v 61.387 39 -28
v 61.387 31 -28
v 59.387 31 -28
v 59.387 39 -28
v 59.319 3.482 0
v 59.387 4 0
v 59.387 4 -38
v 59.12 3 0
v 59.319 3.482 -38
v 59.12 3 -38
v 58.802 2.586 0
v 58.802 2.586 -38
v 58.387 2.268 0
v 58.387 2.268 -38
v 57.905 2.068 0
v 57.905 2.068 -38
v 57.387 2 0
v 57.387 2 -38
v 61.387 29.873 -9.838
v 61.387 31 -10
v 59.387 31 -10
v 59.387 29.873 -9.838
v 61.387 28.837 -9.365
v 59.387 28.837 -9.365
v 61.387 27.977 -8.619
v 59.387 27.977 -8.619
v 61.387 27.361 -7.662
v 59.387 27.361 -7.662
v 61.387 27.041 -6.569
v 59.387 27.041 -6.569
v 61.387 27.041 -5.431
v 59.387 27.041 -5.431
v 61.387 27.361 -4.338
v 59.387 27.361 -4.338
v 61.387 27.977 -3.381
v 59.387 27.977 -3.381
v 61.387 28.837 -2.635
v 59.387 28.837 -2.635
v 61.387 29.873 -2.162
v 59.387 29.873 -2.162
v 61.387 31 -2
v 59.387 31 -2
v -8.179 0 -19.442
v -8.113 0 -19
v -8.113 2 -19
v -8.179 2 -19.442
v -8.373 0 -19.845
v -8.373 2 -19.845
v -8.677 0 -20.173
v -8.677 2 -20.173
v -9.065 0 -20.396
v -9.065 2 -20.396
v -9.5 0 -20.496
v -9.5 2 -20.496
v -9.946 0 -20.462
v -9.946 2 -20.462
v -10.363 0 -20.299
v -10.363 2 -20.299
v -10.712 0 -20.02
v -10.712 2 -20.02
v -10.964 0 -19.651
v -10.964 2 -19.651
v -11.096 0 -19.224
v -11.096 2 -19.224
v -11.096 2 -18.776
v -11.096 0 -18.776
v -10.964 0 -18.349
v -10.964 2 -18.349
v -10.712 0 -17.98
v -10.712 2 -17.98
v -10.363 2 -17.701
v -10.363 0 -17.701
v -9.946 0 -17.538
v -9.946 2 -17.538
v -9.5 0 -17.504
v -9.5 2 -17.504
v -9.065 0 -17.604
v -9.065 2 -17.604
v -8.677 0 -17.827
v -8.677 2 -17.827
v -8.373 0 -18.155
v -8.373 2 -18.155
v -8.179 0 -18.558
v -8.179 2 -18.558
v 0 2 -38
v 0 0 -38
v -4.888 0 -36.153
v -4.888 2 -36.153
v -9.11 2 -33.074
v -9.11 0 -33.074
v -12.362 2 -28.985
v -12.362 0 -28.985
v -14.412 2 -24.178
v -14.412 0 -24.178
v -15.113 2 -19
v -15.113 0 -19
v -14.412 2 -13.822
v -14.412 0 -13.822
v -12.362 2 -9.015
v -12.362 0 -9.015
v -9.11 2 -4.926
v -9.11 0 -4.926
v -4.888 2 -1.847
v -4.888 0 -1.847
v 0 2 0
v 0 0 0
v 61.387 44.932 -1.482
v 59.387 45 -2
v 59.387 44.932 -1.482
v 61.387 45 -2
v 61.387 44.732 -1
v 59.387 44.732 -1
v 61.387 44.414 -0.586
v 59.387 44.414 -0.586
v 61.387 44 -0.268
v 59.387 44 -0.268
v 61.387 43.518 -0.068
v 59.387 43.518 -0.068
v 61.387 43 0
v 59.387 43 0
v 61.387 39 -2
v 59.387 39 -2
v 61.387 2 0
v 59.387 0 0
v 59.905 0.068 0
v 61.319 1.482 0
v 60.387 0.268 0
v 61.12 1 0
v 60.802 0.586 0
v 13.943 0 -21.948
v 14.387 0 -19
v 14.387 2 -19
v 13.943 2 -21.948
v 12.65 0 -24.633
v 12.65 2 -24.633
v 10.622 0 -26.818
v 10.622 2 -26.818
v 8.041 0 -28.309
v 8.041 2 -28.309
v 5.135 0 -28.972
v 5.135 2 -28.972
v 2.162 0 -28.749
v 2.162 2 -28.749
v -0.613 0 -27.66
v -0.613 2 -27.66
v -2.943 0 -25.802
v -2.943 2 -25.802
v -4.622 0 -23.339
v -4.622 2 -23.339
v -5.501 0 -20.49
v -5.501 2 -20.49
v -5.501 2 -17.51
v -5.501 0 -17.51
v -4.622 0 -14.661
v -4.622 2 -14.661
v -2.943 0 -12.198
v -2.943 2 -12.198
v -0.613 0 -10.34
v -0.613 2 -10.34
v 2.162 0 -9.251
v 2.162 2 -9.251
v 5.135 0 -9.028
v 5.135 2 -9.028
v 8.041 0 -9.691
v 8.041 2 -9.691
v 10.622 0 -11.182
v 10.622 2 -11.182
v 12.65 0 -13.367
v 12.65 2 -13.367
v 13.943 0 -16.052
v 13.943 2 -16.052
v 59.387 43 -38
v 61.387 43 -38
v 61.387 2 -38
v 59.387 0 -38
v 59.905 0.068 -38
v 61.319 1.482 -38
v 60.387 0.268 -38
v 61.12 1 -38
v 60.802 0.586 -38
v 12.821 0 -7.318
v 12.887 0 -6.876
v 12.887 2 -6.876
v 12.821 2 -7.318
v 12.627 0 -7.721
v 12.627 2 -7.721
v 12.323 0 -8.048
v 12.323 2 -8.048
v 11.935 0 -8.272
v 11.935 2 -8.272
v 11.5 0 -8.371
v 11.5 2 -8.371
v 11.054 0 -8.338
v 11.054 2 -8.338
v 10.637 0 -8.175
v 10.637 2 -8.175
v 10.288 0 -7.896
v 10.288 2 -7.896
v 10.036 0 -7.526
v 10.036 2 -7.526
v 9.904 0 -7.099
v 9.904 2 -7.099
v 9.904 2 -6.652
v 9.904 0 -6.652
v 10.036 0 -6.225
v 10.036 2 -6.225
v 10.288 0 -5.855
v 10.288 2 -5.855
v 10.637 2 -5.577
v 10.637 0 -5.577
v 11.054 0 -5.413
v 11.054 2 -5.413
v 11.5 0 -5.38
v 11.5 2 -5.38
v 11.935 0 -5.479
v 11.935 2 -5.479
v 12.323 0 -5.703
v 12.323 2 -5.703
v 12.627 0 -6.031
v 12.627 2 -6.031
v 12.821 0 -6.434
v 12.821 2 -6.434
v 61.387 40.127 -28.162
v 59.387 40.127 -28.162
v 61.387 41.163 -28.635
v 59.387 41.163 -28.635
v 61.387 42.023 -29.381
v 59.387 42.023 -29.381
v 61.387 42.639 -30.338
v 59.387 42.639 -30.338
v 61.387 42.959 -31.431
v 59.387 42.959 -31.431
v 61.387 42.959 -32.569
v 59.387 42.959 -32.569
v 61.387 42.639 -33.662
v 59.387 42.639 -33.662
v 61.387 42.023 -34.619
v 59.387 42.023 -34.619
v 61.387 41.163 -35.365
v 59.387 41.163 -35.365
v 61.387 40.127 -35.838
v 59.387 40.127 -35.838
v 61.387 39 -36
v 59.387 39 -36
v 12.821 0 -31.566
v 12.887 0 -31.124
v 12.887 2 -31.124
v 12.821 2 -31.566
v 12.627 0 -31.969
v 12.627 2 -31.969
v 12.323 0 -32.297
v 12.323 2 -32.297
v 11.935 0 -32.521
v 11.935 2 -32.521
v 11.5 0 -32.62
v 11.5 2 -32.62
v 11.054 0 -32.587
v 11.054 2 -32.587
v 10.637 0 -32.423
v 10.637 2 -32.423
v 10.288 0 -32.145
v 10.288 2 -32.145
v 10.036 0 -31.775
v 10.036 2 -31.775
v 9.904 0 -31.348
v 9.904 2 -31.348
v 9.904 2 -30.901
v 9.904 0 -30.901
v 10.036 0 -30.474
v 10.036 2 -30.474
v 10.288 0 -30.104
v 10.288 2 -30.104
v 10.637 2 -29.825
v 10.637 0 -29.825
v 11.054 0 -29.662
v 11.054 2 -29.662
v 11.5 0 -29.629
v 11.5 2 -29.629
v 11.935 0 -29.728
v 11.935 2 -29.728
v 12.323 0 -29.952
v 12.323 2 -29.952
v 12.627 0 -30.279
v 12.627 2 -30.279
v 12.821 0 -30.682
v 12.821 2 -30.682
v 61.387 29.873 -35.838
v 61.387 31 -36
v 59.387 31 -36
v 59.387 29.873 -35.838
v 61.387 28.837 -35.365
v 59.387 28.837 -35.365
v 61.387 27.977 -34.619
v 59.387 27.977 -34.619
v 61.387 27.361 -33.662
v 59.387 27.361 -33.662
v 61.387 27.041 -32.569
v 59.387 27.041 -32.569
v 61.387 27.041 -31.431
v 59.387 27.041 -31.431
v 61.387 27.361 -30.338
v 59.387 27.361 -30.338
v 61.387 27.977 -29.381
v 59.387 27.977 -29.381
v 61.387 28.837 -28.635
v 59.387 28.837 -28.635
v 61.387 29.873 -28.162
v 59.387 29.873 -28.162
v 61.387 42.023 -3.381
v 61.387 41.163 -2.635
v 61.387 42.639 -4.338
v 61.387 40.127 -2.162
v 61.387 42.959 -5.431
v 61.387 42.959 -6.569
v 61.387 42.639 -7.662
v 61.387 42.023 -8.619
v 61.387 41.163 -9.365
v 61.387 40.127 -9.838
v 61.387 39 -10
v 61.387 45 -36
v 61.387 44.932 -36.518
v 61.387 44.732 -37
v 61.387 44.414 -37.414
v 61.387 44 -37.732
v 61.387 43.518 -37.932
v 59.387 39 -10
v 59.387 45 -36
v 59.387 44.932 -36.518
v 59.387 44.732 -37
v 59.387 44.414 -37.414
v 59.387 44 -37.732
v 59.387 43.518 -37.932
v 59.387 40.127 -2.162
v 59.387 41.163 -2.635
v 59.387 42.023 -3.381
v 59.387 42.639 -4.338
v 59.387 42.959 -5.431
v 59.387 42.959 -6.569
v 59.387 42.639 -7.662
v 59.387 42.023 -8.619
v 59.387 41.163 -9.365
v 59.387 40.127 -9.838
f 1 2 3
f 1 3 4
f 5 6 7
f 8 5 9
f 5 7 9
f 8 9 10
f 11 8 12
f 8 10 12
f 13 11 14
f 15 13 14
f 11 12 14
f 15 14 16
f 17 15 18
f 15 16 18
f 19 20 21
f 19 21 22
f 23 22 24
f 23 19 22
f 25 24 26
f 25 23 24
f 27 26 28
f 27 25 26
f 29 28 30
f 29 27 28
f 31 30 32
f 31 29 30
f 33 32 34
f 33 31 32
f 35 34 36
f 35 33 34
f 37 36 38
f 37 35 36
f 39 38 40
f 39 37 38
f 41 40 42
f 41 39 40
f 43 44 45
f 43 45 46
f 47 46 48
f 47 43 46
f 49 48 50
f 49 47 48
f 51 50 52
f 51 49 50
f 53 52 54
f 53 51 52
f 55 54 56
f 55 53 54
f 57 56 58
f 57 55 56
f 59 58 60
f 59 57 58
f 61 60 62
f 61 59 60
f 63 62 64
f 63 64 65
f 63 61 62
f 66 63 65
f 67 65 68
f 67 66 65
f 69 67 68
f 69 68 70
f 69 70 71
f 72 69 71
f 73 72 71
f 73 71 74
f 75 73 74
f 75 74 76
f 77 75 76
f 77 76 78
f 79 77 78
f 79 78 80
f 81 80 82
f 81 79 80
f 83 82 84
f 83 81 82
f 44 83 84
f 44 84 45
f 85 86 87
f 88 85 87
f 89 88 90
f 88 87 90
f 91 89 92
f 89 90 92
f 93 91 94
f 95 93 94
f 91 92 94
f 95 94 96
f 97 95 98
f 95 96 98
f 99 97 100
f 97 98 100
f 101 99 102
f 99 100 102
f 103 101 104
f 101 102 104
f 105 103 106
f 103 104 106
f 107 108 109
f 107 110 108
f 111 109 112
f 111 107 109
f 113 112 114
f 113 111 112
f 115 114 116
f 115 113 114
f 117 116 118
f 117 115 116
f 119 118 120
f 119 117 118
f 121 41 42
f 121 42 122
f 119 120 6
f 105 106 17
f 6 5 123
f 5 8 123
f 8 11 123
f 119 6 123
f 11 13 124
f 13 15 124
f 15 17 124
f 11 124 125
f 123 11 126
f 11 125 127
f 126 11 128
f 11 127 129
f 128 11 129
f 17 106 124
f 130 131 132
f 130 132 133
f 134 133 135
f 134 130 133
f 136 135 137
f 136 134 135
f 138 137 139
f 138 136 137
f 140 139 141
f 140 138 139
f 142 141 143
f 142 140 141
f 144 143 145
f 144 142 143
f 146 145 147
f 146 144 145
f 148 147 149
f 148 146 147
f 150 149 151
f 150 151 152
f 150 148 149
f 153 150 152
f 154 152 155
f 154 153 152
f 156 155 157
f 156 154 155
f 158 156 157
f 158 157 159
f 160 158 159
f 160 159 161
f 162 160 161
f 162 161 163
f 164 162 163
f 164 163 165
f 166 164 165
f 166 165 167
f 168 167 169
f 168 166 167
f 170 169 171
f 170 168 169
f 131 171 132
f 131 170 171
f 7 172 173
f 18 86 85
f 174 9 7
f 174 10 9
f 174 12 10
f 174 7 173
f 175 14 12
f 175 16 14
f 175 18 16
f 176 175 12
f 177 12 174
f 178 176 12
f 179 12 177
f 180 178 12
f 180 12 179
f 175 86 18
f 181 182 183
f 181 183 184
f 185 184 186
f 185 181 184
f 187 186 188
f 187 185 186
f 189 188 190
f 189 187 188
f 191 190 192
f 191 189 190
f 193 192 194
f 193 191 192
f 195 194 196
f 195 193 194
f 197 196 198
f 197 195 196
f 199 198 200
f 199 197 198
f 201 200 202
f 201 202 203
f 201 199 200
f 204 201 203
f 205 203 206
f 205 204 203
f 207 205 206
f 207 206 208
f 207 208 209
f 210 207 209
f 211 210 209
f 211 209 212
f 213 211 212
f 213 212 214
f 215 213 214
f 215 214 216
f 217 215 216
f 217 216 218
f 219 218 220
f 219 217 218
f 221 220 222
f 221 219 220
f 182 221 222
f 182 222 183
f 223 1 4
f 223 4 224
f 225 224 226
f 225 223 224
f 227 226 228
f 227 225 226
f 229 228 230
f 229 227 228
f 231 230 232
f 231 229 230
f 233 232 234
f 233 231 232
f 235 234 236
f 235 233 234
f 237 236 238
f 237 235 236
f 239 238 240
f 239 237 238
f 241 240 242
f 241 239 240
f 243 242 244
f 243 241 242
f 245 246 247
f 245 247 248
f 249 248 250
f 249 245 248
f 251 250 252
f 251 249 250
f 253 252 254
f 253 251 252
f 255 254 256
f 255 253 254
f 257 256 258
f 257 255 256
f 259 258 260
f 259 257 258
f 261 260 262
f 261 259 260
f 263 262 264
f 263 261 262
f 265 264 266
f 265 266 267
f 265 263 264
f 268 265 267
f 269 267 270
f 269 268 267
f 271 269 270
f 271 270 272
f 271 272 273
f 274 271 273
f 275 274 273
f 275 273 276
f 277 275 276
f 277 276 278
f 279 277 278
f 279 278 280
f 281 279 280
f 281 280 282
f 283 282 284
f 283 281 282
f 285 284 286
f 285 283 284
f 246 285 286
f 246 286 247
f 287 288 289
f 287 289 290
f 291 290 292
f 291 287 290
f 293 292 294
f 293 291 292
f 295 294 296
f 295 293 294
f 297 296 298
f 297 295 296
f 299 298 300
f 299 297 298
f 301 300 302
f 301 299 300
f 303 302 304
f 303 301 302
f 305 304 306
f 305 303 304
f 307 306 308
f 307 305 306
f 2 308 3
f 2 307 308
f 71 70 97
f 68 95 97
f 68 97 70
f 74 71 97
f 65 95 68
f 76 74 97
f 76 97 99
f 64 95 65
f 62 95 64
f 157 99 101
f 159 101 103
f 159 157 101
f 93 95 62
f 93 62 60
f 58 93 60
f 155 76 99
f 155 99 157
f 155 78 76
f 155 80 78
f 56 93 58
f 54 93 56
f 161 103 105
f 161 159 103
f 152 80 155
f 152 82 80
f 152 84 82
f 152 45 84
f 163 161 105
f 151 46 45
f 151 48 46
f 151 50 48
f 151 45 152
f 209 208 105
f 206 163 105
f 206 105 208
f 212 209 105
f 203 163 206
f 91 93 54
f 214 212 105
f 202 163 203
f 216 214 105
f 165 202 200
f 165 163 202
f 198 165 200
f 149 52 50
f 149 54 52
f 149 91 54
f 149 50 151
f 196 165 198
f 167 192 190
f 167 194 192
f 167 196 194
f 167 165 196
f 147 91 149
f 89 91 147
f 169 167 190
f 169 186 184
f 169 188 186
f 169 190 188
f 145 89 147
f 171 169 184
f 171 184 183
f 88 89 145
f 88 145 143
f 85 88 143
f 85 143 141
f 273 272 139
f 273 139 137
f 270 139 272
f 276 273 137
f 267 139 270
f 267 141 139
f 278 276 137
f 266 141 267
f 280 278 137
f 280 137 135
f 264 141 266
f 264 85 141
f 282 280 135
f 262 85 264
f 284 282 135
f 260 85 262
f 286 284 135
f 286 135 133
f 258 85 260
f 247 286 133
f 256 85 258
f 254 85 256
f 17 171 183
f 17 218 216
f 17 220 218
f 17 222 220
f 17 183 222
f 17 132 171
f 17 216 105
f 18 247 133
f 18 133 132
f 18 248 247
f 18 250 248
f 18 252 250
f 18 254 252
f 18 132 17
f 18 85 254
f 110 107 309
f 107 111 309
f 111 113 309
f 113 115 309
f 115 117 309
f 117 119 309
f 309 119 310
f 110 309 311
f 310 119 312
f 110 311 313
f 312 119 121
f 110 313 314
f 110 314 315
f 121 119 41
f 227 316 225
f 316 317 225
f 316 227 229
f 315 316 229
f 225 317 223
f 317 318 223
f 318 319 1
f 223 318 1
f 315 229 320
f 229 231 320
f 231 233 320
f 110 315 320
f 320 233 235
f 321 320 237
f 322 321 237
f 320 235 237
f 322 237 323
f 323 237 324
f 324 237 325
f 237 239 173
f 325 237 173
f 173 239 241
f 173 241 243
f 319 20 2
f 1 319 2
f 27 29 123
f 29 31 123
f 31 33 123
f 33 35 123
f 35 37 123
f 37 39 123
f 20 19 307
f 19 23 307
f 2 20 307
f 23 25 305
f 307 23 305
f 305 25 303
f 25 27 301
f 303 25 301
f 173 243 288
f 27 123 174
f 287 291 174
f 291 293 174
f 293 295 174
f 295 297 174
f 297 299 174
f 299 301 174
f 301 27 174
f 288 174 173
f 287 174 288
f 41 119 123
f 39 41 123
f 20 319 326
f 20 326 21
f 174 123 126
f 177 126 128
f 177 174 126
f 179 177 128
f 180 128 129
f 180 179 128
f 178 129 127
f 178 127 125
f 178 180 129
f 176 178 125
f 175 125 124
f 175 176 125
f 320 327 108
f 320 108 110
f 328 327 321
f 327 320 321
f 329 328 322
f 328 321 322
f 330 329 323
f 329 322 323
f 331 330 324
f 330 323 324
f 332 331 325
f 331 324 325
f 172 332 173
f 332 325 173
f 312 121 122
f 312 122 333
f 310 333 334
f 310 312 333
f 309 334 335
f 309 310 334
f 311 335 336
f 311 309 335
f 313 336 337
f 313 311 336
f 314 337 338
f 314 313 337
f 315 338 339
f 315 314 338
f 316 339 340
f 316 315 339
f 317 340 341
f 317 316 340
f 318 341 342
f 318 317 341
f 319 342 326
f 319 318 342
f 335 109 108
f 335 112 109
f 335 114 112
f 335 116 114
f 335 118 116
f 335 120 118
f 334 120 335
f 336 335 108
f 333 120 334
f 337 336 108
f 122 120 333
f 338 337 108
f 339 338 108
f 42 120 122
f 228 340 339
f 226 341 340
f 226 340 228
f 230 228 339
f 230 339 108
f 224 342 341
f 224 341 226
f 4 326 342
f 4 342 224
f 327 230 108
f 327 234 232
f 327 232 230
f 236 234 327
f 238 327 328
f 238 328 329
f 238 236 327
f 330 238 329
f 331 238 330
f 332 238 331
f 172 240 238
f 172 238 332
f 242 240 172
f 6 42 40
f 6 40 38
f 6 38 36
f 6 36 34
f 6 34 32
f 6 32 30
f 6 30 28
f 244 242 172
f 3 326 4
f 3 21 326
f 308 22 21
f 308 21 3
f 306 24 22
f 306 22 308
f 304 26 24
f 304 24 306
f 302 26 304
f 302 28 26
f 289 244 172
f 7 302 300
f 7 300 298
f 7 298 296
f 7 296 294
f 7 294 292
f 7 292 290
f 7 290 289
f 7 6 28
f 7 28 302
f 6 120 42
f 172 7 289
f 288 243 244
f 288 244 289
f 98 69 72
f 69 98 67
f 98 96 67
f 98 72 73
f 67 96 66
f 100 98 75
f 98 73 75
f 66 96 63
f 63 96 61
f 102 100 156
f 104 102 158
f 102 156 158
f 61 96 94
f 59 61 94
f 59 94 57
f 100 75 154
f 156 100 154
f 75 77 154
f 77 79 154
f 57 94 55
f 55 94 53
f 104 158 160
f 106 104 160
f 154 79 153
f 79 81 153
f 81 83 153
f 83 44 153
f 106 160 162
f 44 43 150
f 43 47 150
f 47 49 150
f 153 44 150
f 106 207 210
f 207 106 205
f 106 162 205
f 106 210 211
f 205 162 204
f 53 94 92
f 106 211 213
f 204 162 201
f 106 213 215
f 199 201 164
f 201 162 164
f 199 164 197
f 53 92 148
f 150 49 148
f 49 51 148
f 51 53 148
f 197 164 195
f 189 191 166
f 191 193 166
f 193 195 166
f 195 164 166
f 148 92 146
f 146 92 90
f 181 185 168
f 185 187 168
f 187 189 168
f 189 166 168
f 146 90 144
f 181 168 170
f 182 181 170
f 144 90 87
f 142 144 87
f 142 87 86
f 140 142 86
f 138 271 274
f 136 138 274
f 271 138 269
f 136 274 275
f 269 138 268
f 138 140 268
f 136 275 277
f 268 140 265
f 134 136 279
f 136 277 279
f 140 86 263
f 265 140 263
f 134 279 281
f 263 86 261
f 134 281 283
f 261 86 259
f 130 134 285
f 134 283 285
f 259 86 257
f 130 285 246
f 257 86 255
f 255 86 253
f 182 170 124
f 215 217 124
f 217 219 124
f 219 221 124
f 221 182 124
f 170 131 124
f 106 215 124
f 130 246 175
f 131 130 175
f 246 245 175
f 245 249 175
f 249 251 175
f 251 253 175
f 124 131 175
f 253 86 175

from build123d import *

# Parameters (mm, degrees)
SKETCH1_R           = 1.5
SKETCH1_R_2         = 10
BOSS_EXTRUDE1_DEPTH = 2
SKETCH2_W           = 2
SKETCH2_H           = 38
BOSS_EXTRUDE2_DEPTH = 43
FILLET1_R           = 2
CUT_EXTRUDE1_DEPTH  = 77.5


with BuildPart() as part:
    # Sketch1 → Boss-Extrude1 (new body)
    with BuildSketch(Plane(origin=(0, 0, 0), x_dir=(1, 0, 0), z_dir=(0, 1, 0))):
        with BuildLine():
            Line((0, 0), (61.387482194, 0))
            Line((61.387482194, 0), (61.387482194, 38))
            Line((61.387482194, 38), (0, 38))
            ThreePointArc((0, 38), (-15.112517806, 19), (0, 0))
        make_face()
        with Locations((-9.612517806, 19)):
            Circle(SKETCH1_R, mode=Mode.SUBTRACT)
        with Locations((11.387482194, 31.124355653)):
            Circle(SKETCH1_R, mode=Mode.SUBTRACT)
        with Locations((11.387482194, 6.875644347)):
            Circle(SKETCH1_R, mode=Mode.SUBTRACT)
        with Locations((4.387482194, 19)):
            Circle(SKETCH1_R_2, mode=Mode.SUBTRACT)
    extrude(amount=BOSS_EXTRUDE1_DEPTH)

    # Sketch2 → Boss-Extrude2 (add)
    with BuildSketch(Plane(origin=(0, 2, 0), x_dir=(1, 0, 0), z_dir=(0, 1, 0))):
        with Locations((60.387482194, 19)):
            Rectangle(SKETCH2_W, SKETCH2_H)
    extrude(amount=BOSS_EXTRUDE2_DEPTH)

    # Fillet1
    fillet1_edges = [part.edges().sort_by_distance(p)[0] for p in [
        (61.387482194, 0, -19),
        (59.387482194, 2, -19),
        (60.387482194, 45, -38),
        (60.387482194, 45, 0),
    ]]
    fillet(fillet1_edges, radius=FILLET1_R)

    # Sketch3 → Cut-Extrude1 (cut, through all)
    with BuildSketch(Plane(origin=(61.387482194, 0, 0), x_dir=(0, 0, -1), z_dir=(1, 0, 0))):
        with BuildLine():
            Line((10, 39), (10, 31))
            ThreePointArc((10, 31), (6, 27), (2, 31))
            Line((2, 31), (2, 39))
            ThreePointArc((2, 39), (6, 43), (10, 39))
        make_face()
        with BuildLine():
            Line((36, 39), (36, 31))
            ThreePointArc((36, 31), (32, 27), (28, 31))
            Line((28, 31), (28, 39))
            ThreePointArc((28, 39), (32, 43), (36, 39))
        make_face()
    extrude(amount=-CUT_EXTRUDE1_DEPTH, mode=Mode.SUBTRACT)


solid = part.part
